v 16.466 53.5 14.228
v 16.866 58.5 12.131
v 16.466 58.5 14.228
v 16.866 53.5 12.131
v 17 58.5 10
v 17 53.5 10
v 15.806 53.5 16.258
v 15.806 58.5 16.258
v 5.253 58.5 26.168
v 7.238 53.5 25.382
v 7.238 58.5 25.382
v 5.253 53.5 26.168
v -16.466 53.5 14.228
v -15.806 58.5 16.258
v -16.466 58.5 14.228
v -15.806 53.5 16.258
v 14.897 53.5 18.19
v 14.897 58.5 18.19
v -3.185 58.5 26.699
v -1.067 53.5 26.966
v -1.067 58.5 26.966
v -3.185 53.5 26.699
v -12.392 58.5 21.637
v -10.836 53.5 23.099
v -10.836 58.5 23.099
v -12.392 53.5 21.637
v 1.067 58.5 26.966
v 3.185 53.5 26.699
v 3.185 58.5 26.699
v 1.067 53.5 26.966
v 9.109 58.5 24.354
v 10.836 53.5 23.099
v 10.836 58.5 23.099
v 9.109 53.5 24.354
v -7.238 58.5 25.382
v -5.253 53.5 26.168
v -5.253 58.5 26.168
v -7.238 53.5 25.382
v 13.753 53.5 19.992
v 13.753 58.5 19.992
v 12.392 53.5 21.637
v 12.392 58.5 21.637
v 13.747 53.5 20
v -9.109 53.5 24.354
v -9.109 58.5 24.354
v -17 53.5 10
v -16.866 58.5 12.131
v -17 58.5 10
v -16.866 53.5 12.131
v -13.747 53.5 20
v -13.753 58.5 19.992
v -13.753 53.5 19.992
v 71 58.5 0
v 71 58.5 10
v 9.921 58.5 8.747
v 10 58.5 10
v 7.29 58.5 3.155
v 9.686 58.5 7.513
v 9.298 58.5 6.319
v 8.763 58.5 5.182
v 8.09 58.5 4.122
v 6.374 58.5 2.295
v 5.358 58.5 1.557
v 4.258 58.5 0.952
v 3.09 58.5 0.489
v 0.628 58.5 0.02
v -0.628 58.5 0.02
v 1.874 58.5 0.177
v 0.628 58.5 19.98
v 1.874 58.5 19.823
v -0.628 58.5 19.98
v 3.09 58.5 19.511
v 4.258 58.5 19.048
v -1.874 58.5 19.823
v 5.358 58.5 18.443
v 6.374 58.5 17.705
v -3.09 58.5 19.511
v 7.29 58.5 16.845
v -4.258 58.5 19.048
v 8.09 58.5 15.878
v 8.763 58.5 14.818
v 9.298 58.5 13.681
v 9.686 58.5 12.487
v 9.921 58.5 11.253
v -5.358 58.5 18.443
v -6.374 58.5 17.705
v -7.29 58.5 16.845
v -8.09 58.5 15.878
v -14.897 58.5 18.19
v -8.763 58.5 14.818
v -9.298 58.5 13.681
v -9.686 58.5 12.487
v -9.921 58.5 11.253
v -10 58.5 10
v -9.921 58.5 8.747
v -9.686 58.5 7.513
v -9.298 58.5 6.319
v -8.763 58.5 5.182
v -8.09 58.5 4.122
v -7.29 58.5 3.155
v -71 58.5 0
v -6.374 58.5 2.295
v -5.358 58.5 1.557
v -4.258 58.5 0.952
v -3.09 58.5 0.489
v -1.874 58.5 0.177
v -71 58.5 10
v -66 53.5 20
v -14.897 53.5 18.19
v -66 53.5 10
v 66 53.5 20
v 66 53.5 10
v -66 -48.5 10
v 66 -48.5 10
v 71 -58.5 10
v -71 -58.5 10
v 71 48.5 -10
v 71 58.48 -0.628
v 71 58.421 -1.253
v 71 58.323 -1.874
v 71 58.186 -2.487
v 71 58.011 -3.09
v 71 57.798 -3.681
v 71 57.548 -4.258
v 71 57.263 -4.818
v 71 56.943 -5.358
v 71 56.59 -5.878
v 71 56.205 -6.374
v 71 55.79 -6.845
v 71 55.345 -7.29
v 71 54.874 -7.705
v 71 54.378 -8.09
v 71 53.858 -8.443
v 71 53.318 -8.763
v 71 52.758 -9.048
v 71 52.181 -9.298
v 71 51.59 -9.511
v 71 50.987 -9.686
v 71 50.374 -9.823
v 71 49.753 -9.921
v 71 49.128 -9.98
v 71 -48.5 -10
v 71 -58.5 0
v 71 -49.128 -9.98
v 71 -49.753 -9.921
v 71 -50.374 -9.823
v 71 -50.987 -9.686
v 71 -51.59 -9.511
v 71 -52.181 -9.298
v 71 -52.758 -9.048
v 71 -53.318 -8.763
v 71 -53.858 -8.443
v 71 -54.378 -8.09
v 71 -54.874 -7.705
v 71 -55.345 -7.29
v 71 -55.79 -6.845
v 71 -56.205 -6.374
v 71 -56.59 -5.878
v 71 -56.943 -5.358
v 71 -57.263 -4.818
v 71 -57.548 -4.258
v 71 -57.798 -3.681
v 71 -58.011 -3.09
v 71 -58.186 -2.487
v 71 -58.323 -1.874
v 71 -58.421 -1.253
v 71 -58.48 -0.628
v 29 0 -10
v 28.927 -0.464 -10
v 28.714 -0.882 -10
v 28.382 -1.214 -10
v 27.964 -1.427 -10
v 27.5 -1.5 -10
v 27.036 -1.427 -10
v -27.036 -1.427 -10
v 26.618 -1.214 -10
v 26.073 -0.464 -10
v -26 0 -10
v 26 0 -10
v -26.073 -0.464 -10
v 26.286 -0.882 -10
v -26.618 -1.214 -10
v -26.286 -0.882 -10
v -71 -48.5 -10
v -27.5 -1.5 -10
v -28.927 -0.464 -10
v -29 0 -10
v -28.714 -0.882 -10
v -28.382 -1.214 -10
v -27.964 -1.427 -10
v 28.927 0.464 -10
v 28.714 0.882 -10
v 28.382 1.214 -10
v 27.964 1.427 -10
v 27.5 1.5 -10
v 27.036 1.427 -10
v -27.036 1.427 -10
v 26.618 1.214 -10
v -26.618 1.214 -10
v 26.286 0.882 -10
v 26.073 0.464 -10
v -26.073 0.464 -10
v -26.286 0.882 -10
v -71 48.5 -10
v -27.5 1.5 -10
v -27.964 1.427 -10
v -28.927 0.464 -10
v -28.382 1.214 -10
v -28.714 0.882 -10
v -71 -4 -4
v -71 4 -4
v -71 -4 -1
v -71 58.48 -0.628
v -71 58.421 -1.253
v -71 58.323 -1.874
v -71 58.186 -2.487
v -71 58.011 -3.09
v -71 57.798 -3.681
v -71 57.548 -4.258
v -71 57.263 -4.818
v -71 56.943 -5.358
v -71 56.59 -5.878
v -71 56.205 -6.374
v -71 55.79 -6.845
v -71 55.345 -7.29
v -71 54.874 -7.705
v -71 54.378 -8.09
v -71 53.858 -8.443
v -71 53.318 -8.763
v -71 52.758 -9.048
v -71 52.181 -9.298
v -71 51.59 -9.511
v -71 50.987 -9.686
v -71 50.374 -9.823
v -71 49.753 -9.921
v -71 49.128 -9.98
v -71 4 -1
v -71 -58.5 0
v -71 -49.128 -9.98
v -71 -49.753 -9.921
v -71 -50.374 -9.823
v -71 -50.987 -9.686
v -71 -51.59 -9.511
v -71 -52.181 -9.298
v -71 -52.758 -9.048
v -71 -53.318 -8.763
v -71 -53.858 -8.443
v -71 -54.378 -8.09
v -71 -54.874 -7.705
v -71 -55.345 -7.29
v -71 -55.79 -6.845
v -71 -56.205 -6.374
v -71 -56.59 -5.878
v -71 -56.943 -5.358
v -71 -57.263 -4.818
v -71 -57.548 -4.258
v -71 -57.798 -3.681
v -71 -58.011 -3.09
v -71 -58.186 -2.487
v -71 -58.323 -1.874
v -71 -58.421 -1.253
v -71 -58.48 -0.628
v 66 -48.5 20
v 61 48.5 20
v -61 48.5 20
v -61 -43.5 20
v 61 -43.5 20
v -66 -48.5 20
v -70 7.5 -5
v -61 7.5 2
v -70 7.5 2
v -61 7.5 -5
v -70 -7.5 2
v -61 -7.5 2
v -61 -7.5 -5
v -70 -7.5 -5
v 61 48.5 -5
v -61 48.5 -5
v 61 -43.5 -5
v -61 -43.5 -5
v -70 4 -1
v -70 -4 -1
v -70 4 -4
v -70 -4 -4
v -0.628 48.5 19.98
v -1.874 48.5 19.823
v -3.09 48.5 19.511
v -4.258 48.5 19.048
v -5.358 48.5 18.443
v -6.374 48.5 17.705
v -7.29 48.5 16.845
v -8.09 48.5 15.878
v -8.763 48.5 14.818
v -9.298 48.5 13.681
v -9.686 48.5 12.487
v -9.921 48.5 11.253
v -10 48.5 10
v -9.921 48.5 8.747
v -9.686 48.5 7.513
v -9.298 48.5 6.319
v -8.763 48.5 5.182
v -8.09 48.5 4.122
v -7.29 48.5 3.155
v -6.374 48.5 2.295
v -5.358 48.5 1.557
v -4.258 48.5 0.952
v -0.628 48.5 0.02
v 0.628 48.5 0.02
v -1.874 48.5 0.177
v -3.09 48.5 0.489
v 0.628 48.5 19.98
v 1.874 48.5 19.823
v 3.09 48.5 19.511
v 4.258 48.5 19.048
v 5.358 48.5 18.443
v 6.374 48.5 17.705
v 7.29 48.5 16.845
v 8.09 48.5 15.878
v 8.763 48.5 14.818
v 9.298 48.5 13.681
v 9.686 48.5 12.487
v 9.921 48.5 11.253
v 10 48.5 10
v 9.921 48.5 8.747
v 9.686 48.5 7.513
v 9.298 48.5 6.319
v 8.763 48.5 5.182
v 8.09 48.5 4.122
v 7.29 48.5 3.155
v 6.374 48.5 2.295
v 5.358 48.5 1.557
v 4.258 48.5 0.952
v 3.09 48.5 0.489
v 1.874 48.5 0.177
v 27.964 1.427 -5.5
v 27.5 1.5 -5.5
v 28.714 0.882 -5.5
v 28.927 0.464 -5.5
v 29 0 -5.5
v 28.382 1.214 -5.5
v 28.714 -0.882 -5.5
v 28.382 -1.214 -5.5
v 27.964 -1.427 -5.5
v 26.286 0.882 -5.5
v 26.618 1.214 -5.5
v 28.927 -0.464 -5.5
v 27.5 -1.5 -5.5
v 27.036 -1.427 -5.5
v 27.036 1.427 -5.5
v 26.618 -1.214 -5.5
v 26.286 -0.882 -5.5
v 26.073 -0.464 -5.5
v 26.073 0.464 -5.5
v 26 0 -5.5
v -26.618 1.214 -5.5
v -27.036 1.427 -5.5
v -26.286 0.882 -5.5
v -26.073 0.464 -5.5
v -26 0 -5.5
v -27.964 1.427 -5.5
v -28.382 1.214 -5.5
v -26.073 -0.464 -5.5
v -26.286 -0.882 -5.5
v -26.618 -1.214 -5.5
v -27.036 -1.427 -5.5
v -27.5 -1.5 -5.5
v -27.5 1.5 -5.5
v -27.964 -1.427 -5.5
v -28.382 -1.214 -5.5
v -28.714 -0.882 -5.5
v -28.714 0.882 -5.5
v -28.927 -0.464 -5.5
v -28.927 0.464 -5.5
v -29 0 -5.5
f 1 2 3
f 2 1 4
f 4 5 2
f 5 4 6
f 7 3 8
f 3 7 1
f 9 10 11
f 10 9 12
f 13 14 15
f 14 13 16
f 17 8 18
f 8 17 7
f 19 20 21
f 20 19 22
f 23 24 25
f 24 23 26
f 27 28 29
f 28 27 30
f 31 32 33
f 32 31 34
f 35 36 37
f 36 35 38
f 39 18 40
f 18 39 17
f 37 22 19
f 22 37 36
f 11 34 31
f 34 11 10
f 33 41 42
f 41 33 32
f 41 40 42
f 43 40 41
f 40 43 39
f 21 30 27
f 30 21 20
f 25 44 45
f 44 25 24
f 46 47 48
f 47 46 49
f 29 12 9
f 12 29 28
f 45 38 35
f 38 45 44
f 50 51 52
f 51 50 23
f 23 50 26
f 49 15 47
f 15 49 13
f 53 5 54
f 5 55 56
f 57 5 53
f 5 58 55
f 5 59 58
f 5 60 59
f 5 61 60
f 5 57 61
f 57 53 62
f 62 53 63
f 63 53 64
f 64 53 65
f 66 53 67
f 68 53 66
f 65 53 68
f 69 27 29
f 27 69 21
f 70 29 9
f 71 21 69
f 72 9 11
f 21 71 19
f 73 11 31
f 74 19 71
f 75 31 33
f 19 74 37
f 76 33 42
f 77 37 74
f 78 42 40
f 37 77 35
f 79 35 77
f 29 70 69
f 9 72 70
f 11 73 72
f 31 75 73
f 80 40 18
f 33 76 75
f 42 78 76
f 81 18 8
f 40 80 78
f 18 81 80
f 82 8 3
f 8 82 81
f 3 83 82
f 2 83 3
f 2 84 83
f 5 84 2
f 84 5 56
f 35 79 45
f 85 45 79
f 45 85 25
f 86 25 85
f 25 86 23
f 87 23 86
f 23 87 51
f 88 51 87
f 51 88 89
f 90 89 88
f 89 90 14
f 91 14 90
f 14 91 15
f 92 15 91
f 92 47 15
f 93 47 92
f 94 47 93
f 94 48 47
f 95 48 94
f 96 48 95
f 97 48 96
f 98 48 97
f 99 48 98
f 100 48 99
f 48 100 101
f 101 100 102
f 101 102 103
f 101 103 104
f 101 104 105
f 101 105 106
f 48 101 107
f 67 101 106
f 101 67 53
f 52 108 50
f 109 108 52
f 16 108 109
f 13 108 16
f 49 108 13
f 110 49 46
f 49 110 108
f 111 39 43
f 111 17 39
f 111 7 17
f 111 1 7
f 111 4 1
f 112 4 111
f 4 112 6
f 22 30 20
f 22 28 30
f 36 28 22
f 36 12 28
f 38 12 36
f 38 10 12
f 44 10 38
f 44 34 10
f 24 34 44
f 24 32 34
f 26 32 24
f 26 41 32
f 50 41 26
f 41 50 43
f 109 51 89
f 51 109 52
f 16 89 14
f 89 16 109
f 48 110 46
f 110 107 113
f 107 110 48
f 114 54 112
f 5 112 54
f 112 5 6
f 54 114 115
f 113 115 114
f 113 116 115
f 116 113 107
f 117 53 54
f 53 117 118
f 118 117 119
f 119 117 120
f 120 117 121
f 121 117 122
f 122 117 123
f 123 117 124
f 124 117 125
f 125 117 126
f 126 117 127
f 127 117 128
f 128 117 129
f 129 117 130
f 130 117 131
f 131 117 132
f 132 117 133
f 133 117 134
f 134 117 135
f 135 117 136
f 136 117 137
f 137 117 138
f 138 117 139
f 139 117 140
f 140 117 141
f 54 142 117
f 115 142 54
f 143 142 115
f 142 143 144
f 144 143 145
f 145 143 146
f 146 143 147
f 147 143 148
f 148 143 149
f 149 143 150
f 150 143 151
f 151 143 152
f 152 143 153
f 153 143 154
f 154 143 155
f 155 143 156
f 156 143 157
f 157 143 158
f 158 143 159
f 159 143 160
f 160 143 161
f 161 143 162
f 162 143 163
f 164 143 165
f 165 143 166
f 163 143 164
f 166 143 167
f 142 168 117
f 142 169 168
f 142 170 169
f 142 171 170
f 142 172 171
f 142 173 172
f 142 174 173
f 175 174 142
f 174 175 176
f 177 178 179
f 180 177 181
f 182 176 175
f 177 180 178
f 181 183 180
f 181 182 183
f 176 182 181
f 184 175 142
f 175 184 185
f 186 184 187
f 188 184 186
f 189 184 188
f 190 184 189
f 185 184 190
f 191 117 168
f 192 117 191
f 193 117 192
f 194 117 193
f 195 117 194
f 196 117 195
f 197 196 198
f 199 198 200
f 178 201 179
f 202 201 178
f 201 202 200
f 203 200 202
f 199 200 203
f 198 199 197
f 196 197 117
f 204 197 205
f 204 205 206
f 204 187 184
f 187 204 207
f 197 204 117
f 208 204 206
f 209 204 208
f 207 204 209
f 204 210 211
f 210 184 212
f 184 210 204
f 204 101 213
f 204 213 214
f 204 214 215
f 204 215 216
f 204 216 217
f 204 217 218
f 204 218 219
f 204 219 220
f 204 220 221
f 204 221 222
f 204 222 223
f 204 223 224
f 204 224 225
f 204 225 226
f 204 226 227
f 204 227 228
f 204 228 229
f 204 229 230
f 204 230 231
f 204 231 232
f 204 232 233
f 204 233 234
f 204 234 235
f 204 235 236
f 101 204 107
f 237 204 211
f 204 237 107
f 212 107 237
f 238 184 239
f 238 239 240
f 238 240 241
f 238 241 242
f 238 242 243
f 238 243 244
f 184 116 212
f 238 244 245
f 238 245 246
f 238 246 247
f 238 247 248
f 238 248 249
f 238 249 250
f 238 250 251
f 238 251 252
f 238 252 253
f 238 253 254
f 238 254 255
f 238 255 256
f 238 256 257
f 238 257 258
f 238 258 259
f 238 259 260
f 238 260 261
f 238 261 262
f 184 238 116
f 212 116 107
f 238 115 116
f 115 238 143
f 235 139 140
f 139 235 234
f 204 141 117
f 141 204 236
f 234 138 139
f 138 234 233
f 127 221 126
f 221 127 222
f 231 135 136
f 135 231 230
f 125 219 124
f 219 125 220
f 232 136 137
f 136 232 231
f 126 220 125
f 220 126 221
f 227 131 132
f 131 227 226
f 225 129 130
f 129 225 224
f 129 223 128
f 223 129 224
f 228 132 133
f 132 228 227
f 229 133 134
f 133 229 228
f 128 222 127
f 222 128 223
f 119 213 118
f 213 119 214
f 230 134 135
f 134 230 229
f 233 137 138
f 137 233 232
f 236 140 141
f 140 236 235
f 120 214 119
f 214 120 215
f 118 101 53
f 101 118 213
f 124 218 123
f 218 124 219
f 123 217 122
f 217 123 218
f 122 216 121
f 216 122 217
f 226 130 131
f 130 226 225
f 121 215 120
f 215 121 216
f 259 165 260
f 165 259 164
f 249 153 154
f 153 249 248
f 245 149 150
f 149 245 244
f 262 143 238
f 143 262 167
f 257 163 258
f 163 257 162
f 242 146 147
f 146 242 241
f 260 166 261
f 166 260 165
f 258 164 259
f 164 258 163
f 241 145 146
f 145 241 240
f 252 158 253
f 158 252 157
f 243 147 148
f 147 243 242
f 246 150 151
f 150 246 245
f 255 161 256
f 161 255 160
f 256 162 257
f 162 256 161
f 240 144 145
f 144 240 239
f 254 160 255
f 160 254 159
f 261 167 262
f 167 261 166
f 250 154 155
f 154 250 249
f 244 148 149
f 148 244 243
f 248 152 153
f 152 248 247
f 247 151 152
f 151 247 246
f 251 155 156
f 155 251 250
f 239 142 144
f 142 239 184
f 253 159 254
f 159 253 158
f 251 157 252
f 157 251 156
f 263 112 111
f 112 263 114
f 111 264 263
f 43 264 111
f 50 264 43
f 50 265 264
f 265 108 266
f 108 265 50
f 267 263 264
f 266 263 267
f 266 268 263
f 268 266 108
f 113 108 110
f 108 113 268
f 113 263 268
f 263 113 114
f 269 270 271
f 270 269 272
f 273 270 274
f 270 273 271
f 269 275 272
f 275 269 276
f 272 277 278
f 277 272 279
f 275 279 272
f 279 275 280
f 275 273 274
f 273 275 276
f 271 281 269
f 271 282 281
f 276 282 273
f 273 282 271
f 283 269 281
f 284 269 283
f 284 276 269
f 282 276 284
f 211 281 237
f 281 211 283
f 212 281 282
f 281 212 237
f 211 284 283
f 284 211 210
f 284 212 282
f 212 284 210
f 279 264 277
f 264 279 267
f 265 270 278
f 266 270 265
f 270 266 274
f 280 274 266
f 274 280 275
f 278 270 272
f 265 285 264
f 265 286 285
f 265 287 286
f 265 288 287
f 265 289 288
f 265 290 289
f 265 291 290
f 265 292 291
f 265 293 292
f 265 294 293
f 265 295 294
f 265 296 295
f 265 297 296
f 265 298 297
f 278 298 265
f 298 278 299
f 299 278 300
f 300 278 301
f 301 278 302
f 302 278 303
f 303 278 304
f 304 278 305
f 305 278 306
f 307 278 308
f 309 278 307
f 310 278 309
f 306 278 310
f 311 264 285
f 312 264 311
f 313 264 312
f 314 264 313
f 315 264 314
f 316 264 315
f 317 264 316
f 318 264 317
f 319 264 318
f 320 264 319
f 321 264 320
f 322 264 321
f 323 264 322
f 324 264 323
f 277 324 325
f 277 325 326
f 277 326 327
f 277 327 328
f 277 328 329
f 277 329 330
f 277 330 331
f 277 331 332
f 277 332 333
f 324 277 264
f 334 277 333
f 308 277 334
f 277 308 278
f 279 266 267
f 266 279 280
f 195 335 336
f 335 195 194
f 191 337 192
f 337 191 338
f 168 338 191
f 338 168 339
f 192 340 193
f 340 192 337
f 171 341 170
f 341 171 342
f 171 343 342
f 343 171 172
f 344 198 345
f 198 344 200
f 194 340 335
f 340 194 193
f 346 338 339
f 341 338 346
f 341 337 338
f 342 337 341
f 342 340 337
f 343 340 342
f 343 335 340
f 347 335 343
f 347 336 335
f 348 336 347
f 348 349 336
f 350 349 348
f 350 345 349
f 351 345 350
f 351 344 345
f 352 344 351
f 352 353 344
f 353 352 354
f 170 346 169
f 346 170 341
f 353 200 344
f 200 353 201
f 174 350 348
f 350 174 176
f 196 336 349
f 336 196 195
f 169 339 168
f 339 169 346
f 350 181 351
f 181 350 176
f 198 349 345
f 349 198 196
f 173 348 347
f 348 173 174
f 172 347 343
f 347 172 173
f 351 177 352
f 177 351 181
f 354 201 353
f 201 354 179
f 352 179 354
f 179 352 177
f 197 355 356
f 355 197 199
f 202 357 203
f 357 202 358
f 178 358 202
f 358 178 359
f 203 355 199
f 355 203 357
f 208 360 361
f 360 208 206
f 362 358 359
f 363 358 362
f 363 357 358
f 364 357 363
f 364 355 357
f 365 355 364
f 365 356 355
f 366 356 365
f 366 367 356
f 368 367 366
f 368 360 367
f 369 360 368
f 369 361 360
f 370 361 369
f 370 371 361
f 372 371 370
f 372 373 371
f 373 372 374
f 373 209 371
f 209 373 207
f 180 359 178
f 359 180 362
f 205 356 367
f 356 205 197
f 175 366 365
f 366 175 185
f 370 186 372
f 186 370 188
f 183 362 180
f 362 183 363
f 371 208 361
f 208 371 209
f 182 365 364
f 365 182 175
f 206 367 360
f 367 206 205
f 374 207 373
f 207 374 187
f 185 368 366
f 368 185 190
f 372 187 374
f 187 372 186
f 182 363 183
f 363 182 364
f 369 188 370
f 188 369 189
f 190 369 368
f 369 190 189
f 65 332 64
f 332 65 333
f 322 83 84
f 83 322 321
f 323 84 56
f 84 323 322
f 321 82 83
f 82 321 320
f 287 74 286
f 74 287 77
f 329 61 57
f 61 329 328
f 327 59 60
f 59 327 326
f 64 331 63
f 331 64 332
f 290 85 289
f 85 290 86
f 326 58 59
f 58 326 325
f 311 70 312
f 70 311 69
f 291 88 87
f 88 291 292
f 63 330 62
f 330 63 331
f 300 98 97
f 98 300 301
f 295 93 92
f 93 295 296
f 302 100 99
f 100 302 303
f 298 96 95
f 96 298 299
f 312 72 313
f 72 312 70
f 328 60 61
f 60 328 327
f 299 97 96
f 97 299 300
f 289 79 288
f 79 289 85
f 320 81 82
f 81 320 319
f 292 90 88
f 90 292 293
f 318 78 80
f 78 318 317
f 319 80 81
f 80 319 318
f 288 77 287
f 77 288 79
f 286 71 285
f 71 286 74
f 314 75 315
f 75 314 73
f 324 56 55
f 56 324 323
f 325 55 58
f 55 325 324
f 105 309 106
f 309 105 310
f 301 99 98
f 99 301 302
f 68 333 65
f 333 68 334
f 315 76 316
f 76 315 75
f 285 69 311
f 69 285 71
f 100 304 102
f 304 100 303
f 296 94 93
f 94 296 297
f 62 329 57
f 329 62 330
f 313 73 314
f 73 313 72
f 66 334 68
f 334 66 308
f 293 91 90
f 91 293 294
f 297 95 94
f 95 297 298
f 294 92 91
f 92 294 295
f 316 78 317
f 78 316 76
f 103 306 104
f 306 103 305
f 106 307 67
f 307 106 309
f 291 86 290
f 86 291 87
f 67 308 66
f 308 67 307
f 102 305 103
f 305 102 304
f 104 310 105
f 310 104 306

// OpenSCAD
rayon_courbure = 20;
diam = 34;
diam_button = 20;
hauteur = 10;
largeur = 117;
longueur = 142;
epaisseur1 = 5;
epaisseur2 = 10;
ecart_vis_poignee = 55;
longueur_ci_charge = 28;
largeur_ci_charge = 15;
largeur_usb=8;
hauteur_usb = 3;

difference(){
union(){
translate([0,0,-hauteur/2])
cube([longueur, largeur-rayon_courbure, hauteur], center=true);
translate([0,0,hauteur/2])
cube([longueur, largeur, hauteur], center=true);
translate([0,(largeur-rayon_courbure)/2,0])
rotate([0,90,0])
cylinder(d=rayon_courbure, h=longueur, $fn=100, center=true);
translate([0,-(largeur-rayon_courbure)/2,0])
rotate([0,90,0])
cylinder(d=rayon_courbure, h=longueur, $fn=100, center=true);
translate([0,(epaisseur1+epaisseur2)/2-epaisseur1,3*hauteur/2])
cube([longueur-2*epaisseur1, largeur-epaisseur1-epaisseur2, hauteur], center=true);
    translate([0,largeur/2,3*hauteur/2-hauteur/2])
    rotate([90,0,0])
    difference(){
        cylinder(d=diam, h=epaisseur1, $fn=50);
        translate([-diam/2,-diam,0])
        cube([diam,diam,epaisseur1]);
    }
}
translate([1-(longueur-longueur_ci_charge)/2,0,-(hauteur-hauteur_usb-4)/2])
rotate([0,0,90])
#usb_ci();
translate([0,(epaisseur1+epaisseur2)/2-epaisseur1,3*hauteur/2-hauteur/2])
    cube([longueur-4*epaisseur1, largeur-3*epaisseur1-epaisseur2, 3*hauteur], center=true);
    translate([ecart_vis_poignee/2,0,-3*hauteur/2-0.5])
    #cylinder(d=3, h=10, $fn=20);
    translate([-ecart_vis_poignee/2,0,-3*hauteur/2-0.5])
    #cylinder(d=3, h=10, $fn=20);
    translate([0,1+largeur/2,3*hauteur/2-hauteur/2])
    rotate([90,0,0])
    #cylinder(d=diam_button, h=2+2*epaisseur1, $fn=50);

}

module usb_ci(){
    hauteur = hauteur_usb+4;
    union(){
        cube([largeur_ci_charge,longueur_ci_charge,hauteur], center=true);
        translate([0,longueur_ci_charge/2,1-(hauteur-hauteur_usb)/2])
        #cube([largeur_usb,20,hauteur_usb], center=true);
    }
}
